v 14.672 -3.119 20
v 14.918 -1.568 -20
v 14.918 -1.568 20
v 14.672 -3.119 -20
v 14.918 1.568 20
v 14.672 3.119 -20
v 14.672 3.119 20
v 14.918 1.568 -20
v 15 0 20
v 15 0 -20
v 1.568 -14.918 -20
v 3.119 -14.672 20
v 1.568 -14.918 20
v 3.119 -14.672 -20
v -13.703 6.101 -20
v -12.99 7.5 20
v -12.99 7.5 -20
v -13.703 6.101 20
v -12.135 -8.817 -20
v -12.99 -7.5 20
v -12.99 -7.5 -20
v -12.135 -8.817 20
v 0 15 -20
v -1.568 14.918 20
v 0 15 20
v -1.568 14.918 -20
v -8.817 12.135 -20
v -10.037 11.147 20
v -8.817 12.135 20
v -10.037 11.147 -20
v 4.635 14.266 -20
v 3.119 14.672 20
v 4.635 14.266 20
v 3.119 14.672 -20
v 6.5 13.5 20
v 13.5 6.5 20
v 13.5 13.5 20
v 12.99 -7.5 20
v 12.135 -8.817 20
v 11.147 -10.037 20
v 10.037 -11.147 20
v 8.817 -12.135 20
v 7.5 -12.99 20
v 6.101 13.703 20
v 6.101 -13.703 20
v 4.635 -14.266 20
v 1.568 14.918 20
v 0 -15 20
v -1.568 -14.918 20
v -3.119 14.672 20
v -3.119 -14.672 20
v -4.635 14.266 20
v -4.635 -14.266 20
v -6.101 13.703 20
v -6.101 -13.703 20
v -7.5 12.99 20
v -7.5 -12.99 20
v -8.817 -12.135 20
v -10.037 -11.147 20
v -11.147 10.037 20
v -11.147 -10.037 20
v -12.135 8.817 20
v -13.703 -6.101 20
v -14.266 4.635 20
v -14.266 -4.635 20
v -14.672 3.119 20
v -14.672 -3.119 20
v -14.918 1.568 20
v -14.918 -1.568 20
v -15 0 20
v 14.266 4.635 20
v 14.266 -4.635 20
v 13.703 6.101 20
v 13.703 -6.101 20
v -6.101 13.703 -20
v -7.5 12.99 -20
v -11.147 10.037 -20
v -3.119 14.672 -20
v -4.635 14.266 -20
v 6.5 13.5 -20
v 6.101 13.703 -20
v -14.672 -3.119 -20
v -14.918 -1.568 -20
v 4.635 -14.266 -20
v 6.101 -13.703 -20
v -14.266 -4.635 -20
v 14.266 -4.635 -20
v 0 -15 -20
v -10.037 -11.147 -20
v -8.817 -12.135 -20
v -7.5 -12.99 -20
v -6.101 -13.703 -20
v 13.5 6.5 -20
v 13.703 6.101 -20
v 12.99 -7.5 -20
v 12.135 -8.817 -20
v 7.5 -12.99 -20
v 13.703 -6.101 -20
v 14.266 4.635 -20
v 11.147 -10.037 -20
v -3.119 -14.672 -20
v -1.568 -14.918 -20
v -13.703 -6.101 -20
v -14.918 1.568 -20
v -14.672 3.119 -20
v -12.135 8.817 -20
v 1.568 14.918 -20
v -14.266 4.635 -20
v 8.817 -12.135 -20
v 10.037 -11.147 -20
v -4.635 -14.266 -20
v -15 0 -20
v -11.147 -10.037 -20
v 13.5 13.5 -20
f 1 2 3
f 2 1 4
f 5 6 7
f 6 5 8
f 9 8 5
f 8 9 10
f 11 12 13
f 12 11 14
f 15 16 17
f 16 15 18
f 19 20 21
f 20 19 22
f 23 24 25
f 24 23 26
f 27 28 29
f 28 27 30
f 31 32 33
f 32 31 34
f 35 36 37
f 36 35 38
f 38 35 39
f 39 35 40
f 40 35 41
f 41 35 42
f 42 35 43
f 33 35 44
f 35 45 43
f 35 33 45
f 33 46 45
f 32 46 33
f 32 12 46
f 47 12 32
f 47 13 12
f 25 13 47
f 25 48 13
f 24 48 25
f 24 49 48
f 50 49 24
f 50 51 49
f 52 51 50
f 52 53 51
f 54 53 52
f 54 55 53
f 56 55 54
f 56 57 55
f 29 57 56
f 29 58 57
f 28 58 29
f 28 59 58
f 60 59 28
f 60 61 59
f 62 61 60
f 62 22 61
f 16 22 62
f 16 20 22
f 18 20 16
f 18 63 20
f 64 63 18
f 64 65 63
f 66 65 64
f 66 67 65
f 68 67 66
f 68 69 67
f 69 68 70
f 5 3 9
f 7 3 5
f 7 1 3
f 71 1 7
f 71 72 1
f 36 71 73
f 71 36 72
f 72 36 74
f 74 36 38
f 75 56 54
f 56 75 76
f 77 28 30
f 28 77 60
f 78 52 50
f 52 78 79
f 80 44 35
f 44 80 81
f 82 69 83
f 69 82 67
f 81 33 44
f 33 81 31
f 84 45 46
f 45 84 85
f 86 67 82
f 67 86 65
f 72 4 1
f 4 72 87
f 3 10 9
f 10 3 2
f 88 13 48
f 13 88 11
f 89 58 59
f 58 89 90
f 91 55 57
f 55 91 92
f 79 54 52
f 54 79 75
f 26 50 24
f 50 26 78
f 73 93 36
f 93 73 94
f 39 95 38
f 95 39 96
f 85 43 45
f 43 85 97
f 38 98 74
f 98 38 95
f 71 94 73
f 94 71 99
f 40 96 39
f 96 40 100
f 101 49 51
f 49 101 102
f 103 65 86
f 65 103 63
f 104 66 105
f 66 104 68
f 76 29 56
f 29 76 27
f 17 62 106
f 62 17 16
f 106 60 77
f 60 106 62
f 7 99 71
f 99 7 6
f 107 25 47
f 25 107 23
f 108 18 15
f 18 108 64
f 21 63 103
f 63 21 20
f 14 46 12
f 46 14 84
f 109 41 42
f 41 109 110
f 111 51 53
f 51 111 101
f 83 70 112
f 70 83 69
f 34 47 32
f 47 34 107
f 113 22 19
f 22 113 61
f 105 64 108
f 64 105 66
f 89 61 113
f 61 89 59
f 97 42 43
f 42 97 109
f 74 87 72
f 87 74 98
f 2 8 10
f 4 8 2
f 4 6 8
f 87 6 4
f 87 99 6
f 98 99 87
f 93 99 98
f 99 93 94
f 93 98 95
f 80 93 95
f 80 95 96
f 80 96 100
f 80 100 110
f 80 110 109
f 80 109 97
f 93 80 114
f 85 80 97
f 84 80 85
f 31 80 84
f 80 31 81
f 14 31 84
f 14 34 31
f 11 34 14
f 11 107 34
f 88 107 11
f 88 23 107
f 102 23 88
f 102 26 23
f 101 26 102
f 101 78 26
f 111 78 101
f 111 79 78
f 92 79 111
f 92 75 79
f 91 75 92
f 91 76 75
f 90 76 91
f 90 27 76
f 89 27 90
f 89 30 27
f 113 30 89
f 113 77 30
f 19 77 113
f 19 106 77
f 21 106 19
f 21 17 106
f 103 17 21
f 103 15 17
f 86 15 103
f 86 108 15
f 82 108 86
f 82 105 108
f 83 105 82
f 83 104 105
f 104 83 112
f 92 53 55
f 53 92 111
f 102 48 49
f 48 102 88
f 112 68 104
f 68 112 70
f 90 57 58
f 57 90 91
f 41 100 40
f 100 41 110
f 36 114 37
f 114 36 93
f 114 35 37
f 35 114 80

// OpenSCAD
$fn=60;
cylinder(d=30,h=40,center=true);
translate([10,10,0])
	cube([7,7,40],center=true);
